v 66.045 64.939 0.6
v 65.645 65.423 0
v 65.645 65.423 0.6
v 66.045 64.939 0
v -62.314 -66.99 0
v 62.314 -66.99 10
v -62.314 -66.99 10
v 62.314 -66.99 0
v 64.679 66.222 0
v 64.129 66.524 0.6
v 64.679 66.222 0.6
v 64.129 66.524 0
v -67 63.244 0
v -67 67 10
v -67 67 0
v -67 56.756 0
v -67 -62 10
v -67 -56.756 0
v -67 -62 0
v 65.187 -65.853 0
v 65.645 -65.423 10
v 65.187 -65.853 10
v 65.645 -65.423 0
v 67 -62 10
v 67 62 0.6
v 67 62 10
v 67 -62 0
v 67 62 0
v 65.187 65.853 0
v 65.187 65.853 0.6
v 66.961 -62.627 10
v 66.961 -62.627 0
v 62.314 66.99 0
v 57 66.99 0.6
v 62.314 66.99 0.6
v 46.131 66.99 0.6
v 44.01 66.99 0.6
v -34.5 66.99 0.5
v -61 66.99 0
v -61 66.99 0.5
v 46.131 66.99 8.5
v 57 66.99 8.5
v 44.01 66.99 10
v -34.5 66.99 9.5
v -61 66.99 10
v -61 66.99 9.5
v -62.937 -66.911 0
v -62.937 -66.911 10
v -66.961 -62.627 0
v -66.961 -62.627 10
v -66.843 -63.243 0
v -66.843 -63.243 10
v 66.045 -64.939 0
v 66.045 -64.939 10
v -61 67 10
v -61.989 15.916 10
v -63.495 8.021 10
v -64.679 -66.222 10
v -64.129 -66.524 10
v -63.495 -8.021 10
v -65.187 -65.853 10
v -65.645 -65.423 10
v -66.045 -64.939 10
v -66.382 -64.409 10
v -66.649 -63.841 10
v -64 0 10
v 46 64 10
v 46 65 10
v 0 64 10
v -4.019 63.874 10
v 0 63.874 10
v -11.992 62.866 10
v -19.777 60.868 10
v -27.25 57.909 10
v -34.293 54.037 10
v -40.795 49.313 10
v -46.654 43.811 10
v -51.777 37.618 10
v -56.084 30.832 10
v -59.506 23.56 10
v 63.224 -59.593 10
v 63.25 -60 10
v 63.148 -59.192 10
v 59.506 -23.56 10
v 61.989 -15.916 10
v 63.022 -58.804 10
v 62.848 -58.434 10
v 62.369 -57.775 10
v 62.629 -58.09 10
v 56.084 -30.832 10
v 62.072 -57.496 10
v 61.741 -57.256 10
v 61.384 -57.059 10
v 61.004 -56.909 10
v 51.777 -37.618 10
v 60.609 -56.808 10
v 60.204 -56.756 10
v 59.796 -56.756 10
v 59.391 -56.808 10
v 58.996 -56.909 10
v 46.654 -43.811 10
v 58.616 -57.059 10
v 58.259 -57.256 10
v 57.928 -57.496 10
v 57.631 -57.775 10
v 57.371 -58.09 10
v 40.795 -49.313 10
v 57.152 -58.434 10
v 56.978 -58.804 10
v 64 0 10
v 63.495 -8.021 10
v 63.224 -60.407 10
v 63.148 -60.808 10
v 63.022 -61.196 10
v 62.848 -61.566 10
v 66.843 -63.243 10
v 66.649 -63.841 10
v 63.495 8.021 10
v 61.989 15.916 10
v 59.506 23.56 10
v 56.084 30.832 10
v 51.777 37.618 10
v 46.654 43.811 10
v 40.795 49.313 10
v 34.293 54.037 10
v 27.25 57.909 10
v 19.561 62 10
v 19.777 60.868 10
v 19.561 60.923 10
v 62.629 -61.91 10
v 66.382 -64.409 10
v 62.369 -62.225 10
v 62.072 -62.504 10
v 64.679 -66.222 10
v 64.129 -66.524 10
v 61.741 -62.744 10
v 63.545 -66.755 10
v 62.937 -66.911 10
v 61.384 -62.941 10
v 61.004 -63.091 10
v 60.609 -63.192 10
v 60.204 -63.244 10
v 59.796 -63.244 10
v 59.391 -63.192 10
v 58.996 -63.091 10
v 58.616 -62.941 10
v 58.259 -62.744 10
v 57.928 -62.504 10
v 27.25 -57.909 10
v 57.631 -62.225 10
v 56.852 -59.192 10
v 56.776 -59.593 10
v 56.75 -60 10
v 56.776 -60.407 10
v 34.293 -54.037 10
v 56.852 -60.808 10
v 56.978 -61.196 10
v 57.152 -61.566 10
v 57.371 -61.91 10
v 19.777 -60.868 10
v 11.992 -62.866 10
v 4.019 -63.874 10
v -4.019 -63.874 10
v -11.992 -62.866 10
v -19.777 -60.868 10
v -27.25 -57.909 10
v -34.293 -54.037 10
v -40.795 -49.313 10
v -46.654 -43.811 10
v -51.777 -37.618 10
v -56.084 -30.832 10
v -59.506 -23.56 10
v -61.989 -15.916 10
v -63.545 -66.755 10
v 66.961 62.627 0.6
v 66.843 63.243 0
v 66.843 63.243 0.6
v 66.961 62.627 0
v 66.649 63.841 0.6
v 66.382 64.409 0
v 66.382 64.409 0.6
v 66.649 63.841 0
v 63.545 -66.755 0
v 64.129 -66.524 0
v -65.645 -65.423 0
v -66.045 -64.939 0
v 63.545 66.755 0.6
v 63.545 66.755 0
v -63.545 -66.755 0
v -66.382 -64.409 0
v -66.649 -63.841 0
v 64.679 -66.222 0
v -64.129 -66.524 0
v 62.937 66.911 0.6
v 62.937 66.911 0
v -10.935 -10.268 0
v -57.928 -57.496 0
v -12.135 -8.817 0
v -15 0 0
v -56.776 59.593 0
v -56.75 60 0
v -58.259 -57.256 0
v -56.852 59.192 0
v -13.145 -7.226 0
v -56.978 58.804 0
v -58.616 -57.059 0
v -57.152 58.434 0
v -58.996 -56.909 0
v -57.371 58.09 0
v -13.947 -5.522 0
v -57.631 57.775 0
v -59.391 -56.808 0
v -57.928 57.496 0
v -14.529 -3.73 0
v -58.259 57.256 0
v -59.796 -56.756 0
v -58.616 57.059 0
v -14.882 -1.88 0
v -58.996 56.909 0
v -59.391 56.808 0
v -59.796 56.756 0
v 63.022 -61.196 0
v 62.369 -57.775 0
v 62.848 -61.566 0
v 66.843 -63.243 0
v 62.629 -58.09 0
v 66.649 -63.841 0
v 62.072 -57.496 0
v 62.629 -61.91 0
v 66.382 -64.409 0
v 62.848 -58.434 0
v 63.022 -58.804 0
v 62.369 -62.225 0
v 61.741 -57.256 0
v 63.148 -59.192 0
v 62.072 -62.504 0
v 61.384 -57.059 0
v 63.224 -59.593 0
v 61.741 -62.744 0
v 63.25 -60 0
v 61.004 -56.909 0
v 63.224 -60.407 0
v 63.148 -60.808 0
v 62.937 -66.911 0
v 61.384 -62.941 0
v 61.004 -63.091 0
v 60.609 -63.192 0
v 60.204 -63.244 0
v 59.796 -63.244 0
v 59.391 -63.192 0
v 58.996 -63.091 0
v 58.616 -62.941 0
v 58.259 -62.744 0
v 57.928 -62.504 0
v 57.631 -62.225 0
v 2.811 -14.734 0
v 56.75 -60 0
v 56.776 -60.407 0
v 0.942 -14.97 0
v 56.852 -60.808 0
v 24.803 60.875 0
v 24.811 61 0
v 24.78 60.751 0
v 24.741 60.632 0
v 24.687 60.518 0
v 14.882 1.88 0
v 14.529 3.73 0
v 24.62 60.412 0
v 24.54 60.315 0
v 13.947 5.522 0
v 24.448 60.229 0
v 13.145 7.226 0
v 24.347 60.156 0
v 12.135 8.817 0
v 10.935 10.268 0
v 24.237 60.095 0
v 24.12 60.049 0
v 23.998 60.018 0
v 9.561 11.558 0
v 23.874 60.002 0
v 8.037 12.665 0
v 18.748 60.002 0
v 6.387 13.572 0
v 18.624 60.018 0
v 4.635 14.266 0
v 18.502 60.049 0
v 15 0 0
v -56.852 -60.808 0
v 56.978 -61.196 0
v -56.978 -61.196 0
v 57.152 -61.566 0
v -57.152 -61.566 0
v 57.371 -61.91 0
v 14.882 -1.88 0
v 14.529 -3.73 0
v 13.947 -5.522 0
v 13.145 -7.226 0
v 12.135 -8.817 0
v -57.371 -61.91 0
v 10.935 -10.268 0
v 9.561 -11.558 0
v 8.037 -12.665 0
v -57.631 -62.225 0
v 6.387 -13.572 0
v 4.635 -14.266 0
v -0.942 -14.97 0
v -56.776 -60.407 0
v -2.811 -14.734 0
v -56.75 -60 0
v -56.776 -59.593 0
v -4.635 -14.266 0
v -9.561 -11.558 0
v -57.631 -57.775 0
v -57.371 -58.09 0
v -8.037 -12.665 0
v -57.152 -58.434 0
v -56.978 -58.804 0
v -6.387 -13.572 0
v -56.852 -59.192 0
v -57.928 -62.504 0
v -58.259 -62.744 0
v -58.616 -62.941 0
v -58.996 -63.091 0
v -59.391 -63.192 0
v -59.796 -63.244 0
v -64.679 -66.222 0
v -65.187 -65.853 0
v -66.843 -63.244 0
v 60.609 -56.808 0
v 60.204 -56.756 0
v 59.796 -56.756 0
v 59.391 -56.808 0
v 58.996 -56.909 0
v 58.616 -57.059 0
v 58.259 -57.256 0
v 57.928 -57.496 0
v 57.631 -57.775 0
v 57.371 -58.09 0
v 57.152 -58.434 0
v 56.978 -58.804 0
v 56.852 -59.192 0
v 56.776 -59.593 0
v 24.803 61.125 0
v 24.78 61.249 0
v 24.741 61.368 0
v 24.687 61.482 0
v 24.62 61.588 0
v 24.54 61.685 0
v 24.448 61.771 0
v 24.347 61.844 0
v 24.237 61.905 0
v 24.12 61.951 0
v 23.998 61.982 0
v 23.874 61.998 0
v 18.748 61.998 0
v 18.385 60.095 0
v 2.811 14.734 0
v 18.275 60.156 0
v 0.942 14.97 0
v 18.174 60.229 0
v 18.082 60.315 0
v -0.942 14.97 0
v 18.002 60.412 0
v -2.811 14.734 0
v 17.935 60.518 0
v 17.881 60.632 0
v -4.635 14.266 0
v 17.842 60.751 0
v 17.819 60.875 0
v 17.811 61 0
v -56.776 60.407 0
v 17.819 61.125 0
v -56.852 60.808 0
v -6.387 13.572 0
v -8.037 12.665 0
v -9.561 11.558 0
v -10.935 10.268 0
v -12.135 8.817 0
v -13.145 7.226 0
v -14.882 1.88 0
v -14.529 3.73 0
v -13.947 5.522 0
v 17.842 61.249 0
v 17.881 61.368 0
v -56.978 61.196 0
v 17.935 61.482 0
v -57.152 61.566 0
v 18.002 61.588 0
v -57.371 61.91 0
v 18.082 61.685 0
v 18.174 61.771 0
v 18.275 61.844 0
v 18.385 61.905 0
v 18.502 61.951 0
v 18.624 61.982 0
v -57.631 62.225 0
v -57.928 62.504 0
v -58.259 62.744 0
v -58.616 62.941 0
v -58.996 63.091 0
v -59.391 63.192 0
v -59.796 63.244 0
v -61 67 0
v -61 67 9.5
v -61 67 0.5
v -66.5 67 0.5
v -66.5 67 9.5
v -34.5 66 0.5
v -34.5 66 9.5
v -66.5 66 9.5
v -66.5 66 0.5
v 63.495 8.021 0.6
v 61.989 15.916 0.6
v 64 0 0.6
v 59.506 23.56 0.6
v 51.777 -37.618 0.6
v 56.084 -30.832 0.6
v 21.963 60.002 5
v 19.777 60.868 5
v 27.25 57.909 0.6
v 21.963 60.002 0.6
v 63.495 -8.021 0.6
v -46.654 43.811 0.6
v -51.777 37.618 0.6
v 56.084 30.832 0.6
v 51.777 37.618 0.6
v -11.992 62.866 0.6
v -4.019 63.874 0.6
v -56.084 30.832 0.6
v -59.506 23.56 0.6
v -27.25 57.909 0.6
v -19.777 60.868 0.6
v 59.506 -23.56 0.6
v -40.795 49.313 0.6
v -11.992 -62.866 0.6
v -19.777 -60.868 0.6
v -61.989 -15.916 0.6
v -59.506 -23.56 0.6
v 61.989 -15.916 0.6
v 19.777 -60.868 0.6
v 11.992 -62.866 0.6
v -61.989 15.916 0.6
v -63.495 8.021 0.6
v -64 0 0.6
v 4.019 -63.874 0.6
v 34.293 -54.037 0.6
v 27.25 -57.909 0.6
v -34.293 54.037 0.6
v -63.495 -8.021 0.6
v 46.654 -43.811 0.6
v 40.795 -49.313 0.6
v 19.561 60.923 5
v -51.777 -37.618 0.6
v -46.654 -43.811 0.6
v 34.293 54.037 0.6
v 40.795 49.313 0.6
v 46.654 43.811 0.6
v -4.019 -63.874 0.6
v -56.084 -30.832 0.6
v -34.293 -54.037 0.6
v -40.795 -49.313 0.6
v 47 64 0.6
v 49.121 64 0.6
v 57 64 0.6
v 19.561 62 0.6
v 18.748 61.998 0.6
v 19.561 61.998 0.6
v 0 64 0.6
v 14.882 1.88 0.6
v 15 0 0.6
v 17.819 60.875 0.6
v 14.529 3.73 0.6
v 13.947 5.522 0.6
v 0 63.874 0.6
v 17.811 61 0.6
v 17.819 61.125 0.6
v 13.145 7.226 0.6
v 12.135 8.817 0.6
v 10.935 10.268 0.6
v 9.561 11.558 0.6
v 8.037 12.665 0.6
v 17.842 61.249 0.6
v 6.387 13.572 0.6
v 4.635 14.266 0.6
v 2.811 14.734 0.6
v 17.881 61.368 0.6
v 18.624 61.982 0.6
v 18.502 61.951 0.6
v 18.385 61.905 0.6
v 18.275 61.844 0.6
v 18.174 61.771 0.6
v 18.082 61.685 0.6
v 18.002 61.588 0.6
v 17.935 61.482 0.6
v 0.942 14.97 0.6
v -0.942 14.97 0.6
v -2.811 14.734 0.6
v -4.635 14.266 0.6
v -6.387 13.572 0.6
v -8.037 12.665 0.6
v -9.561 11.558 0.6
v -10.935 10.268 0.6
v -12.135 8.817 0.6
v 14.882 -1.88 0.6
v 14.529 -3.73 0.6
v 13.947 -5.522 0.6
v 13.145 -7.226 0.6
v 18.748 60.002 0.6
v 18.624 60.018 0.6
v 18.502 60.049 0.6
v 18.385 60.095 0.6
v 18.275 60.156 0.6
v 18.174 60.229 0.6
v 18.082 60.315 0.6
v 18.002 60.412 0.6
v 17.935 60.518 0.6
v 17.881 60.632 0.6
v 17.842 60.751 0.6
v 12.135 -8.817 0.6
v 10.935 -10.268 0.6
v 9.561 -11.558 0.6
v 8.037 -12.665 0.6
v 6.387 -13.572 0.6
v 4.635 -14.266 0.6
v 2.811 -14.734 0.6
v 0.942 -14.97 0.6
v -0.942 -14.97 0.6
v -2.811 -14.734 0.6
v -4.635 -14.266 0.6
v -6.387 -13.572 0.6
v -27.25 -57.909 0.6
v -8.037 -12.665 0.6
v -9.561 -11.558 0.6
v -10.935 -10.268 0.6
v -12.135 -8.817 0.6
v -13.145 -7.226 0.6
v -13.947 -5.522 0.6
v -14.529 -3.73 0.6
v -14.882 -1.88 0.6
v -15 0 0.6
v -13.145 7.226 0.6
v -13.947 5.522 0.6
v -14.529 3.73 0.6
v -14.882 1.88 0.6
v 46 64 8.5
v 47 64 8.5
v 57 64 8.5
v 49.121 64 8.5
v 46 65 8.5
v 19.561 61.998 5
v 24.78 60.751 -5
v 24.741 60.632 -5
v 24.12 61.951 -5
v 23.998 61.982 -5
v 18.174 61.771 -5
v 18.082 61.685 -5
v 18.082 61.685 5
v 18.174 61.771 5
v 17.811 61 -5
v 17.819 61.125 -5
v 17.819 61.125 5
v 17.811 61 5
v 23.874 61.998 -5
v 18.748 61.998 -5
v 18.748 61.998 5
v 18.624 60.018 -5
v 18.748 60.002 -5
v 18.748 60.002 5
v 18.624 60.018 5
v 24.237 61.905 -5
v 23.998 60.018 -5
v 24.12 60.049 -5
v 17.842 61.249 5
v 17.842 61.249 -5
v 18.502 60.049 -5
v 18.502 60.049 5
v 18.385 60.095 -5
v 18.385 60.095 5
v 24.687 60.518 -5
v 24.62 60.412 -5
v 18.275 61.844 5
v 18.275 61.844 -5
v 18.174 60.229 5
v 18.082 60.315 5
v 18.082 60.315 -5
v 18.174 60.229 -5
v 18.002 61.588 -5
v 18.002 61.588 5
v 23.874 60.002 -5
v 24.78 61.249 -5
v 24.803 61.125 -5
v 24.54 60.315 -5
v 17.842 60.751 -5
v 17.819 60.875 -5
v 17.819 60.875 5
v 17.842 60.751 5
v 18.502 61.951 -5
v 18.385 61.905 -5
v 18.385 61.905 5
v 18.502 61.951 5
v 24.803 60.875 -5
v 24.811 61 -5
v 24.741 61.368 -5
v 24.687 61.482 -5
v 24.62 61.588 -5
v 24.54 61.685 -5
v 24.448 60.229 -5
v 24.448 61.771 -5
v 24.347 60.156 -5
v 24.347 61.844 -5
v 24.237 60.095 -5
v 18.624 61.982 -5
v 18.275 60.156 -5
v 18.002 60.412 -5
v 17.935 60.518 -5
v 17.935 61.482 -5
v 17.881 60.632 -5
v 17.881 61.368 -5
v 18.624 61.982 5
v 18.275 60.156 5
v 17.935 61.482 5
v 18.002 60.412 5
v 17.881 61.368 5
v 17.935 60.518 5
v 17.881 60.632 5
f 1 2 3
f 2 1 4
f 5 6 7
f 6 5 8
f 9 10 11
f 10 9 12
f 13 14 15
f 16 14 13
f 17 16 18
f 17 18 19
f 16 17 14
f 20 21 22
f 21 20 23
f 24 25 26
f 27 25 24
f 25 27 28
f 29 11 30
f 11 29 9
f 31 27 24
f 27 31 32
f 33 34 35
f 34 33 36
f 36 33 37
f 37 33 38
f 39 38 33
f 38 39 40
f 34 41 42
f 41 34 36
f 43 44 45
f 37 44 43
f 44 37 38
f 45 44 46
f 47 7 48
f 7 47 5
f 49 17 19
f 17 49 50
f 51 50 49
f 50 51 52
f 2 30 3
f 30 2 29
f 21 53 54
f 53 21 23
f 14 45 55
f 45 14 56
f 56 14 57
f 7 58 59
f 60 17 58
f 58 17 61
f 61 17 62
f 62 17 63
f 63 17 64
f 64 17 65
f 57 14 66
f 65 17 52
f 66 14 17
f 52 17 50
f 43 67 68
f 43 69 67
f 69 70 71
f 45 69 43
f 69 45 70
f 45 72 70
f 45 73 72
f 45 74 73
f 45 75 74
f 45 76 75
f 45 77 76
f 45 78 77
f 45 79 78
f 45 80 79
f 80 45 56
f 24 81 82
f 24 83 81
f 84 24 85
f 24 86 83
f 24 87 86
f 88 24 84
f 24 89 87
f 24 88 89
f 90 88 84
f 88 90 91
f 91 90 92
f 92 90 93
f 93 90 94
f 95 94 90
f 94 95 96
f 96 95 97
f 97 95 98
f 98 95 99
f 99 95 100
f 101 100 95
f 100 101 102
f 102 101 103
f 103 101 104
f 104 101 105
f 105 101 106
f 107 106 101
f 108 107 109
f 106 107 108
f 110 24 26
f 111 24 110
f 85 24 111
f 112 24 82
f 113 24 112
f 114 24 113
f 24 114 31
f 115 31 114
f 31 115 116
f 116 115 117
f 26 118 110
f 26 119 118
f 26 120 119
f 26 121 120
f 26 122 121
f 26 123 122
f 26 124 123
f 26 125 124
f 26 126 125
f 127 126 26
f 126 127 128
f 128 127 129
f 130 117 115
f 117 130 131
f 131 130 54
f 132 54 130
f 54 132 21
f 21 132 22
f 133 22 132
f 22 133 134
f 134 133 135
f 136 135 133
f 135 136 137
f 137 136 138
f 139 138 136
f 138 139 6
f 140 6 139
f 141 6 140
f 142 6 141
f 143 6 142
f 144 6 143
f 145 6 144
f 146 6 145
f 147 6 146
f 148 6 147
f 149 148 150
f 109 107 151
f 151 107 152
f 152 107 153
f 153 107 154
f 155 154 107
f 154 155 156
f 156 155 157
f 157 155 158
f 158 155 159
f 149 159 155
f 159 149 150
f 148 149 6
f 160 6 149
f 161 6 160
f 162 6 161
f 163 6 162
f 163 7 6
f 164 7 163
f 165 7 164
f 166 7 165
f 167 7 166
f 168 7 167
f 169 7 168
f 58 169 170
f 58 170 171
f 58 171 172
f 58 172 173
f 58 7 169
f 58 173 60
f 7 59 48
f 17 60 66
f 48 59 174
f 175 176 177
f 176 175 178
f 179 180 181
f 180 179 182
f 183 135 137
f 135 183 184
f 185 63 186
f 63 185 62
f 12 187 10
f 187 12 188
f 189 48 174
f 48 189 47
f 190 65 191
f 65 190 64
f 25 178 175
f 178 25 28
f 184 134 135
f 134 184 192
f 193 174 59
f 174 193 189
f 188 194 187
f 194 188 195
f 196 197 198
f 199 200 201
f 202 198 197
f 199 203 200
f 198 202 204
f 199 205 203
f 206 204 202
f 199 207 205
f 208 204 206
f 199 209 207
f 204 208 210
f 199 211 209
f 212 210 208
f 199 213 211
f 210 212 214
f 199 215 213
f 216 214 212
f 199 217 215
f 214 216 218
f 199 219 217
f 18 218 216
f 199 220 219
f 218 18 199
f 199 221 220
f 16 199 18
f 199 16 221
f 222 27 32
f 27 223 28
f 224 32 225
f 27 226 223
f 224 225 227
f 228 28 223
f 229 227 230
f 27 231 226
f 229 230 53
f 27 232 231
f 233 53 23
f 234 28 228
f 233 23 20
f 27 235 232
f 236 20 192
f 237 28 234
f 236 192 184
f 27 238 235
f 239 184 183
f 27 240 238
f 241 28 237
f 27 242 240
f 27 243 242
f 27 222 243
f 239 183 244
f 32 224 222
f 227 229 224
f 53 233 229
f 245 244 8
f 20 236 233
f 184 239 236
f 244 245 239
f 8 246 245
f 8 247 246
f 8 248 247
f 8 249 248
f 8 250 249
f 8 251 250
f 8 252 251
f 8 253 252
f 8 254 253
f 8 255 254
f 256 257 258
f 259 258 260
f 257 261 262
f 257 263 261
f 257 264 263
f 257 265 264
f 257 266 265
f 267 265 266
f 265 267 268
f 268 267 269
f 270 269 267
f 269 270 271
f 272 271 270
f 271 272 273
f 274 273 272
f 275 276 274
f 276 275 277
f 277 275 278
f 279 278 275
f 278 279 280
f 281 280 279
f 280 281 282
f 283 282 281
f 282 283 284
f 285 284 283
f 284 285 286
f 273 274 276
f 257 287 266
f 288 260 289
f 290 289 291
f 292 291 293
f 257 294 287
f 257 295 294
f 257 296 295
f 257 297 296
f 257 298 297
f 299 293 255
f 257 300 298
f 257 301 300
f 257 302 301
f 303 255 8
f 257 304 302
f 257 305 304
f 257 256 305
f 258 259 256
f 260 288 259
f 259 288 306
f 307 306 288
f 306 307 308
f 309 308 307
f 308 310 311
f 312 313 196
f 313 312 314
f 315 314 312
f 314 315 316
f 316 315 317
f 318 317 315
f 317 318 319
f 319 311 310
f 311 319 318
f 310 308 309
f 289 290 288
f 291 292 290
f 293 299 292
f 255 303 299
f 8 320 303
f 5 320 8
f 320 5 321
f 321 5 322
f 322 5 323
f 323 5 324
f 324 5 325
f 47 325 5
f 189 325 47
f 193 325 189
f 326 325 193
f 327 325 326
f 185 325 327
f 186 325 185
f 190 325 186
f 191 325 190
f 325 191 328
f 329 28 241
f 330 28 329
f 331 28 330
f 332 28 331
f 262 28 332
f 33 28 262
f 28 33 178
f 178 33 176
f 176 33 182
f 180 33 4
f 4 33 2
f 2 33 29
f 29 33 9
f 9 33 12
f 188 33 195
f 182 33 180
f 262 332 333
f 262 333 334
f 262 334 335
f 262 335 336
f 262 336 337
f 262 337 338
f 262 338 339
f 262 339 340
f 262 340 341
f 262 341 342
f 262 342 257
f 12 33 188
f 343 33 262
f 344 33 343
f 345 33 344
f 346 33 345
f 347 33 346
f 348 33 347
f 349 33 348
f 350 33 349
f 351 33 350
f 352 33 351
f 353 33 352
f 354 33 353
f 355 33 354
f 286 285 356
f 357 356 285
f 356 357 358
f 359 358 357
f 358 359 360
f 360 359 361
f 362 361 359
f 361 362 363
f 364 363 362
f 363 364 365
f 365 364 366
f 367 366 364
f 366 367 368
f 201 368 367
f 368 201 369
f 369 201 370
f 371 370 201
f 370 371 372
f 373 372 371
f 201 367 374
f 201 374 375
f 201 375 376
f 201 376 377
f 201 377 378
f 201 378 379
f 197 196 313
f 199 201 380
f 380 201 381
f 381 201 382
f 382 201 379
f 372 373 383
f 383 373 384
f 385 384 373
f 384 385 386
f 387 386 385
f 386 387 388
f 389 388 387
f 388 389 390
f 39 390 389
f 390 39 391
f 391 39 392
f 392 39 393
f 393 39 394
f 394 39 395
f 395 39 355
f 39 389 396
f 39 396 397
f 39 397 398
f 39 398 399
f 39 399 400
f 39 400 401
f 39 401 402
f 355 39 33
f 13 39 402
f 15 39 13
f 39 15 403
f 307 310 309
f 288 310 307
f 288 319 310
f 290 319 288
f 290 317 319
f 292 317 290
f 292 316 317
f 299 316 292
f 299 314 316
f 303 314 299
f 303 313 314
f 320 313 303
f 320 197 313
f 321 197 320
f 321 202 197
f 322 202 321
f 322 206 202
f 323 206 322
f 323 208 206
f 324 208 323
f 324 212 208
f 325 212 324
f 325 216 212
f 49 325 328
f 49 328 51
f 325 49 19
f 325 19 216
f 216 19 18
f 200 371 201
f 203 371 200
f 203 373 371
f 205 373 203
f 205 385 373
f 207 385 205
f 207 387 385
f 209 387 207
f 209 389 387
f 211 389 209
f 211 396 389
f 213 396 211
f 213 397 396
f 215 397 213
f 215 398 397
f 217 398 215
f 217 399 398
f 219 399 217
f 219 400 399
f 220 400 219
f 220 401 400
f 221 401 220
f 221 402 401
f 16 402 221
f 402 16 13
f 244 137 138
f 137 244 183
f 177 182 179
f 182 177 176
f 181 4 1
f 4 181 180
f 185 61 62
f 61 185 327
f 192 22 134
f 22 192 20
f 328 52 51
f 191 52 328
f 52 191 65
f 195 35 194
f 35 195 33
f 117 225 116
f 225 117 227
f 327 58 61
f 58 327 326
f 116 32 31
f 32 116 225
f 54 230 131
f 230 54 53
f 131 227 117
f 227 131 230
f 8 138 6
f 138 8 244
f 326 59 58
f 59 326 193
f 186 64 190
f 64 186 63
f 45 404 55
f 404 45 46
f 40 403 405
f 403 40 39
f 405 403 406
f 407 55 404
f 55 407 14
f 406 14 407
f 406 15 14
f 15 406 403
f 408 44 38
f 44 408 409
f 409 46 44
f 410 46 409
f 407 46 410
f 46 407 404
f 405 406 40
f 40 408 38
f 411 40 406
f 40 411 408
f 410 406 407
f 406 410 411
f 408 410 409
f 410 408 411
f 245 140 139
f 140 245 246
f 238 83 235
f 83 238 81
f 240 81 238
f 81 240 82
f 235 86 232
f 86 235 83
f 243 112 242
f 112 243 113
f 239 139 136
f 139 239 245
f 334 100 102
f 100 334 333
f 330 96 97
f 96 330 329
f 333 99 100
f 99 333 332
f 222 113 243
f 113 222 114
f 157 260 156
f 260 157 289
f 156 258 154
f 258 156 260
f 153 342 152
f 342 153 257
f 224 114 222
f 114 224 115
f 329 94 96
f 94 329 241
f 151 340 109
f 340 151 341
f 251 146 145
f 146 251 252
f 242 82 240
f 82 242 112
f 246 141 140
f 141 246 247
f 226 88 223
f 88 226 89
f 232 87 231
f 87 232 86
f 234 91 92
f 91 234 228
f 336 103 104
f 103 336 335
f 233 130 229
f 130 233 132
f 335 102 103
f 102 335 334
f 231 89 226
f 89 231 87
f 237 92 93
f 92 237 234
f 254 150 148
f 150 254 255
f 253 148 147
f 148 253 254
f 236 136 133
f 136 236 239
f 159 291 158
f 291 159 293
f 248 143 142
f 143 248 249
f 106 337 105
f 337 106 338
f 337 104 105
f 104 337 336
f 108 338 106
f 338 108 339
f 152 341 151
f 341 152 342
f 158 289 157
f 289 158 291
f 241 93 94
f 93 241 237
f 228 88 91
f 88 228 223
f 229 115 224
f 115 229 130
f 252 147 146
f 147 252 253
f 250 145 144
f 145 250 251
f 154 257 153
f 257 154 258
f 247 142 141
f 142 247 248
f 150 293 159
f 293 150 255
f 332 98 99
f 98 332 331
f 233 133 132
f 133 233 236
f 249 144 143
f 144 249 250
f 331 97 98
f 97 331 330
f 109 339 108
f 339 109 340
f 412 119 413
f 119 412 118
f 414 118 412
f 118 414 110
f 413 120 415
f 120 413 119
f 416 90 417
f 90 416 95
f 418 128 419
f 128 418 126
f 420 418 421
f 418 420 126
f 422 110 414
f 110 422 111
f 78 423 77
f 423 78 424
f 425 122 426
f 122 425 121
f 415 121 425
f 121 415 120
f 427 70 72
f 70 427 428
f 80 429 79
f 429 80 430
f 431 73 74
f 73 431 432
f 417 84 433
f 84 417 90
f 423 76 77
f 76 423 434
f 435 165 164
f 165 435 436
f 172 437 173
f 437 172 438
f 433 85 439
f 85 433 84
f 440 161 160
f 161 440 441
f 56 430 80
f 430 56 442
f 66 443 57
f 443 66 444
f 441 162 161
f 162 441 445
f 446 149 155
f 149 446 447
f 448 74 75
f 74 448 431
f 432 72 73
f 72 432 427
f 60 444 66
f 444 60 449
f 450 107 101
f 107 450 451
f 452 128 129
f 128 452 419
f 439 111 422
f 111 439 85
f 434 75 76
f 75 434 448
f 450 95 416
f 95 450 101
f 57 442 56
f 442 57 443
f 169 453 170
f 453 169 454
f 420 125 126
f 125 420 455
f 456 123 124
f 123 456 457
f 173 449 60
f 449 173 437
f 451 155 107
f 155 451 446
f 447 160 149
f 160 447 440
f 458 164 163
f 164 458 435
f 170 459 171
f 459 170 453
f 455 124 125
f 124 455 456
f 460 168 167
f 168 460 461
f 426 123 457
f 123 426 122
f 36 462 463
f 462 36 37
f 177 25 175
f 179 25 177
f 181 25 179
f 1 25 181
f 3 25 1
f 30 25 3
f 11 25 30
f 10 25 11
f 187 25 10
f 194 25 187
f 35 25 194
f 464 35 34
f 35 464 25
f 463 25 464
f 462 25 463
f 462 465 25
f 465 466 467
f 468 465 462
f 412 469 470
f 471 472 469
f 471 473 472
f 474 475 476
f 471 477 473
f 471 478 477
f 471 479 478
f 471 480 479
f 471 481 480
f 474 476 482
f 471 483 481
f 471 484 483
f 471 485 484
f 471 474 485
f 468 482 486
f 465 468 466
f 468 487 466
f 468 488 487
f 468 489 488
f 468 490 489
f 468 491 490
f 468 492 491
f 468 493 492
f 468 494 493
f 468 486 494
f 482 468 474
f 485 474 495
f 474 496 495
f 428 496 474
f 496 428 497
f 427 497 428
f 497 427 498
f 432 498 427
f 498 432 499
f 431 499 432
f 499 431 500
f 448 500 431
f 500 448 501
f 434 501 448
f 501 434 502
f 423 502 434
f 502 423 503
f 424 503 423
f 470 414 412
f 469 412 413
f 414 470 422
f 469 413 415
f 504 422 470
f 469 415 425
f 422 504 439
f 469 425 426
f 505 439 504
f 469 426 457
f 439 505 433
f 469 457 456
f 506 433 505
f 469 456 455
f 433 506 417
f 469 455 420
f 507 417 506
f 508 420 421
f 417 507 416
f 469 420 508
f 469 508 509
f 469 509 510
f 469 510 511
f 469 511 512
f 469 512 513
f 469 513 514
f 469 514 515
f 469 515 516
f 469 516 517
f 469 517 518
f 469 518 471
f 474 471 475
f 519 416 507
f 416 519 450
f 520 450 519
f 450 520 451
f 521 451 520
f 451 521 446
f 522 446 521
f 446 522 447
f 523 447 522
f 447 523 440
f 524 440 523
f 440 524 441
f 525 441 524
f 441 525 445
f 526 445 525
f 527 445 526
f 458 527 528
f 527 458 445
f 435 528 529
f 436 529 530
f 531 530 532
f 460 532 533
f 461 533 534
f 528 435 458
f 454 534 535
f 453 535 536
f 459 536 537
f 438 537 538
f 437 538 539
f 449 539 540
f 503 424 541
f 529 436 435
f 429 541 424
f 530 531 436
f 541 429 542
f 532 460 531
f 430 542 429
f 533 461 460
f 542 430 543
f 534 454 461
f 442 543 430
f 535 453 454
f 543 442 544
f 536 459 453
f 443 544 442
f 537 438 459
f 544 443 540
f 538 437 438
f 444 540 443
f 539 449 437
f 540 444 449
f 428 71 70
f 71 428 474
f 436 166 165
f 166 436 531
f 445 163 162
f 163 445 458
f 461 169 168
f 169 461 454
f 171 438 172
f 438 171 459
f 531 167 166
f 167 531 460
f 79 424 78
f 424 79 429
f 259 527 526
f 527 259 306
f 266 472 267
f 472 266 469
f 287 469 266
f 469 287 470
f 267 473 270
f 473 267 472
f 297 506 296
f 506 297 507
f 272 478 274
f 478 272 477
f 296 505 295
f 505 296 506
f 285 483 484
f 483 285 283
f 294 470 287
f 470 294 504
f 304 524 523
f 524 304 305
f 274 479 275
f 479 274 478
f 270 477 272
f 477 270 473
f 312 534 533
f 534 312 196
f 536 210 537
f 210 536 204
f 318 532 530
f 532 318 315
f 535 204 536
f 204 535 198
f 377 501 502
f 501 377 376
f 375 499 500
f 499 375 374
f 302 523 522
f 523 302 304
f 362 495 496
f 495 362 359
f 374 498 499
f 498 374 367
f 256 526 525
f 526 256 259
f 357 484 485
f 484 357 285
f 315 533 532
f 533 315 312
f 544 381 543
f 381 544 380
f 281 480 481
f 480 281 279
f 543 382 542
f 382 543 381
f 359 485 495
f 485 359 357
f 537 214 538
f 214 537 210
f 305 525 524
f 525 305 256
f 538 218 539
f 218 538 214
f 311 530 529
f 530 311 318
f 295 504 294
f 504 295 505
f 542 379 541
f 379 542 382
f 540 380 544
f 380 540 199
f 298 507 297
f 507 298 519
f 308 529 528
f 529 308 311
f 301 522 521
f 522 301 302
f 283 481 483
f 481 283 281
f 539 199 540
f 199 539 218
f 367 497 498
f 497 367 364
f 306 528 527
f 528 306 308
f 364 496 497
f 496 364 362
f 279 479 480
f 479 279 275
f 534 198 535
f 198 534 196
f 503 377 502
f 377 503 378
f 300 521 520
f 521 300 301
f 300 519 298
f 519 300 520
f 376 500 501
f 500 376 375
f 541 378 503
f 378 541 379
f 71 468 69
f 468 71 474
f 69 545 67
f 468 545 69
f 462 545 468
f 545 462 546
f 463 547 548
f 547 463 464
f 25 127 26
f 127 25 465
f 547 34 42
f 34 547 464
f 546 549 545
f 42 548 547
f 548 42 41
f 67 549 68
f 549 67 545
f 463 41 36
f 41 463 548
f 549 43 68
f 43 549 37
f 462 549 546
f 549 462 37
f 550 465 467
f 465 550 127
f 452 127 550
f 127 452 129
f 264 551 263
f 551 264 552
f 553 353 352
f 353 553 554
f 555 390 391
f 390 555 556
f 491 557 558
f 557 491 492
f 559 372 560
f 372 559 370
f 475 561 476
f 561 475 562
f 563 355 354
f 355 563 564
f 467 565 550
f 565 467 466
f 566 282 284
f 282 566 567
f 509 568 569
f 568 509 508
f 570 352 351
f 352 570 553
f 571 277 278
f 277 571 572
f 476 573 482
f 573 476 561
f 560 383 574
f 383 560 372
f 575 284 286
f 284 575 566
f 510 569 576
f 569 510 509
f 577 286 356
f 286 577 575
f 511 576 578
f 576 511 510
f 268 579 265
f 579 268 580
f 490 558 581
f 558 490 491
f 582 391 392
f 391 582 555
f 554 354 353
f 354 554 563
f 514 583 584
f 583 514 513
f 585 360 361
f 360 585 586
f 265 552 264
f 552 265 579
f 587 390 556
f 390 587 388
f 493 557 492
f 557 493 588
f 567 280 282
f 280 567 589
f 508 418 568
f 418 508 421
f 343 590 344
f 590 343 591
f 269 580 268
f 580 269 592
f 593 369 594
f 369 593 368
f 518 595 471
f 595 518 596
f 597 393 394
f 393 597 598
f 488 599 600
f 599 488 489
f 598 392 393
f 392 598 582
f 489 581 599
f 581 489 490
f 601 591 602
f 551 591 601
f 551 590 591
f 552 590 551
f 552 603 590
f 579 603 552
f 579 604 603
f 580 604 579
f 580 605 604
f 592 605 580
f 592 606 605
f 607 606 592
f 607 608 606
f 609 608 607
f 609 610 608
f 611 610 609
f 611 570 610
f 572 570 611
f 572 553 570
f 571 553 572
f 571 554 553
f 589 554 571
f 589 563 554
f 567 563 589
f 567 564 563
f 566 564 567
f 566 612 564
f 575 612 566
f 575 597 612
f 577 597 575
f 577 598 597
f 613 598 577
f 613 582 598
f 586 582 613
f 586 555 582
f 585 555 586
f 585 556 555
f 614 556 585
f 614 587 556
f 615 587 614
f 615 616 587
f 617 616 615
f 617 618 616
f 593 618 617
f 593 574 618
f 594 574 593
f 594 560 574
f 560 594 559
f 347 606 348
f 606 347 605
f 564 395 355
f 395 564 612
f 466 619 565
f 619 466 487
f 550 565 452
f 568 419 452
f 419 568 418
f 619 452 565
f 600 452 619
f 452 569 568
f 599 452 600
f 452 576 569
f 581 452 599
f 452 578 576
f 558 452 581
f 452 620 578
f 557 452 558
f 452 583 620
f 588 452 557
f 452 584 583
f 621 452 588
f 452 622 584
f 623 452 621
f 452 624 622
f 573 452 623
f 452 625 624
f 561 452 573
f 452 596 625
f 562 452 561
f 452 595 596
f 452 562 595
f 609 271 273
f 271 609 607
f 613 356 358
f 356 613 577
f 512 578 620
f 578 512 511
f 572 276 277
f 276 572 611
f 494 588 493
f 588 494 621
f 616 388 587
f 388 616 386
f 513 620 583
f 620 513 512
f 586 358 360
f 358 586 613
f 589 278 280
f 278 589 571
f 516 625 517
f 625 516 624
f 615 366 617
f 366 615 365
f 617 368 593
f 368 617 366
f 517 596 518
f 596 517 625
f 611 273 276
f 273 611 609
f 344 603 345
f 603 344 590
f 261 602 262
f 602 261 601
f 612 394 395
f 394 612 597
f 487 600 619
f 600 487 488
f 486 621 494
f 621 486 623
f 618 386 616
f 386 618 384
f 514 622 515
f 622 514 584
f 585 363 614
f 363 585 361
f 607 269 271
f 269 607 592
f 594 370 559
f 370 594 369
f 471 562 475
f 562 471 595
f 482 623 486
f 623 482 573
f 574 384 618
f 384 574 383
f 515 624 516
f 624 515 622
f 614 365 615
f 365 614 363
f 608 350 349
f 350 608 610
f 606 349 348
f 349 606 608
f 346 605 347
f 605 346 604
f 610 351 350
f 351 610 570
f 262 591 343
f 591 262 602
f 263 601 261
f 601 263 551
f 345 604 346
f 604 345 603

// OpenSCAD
$fn = 50;


union() {
	difference() {
		union() {
			hull() {
				translate(v = [-62.0000000000, 62.0000000000, 0]) {
					cylinder(h = 10, r = 5);
				}
				translate(v = [62.0000000000, 62.0000000000, 0]) {
					cylinder(h = 10, r = 5);
				}
				translate(v = [-62.0000000000, -62.0000000000, 0]) {
					cylinder(h = 10, r = 5);
				}
				translate(v = [62.0000000000, -62.0000000000, 0]) {
					cylinder(h = 10, r = 5);
				}
			}
			translate(v = [-67.0000000000, 61.0000000000, 0]) {
				cube(size = [6, 6, 10]);
			}
		}
		union() {
			translate(v = [-67.5000000000, -60.0000000000, -250.0000000000]) {
				rotate(a = [0, 0, 0]) {
					difference() {
						union() {
							hull() {
								translate(v = [7.5000000000, 0, 0]) {
									cylinder(h = 250, r = 3.2500000000, r1 = 3.2500000000, r2 = 3.2500000000);
								}
								translate(v = [-7.5000000000, 0, 0]) {
									cylinder(h = 250, r = 3.2500000000, r1 = 3.2500000000, r2 = 3.2500000000);
								}
							}
						}
						union();
					}
				}
			}
			translate(v = [-67.5000000000, 60.0000000000, -250.0000000000]) {
				rotate(a = [0, 0, 0]) {
					difference() {
						union() {
							hull() {
								translate(v = [7.5000000000, 0, 0]) {
									cylinder(h = 250, r = 3.2500000000, r1 = 3.2500000000, r2 = 3.2500000000);
								}
								translate(v = [-7.5000000000, 0, 0]) {
									cylinder(h = 250, r = 3.2500000000, r1 = 3.2500000000, r2 = 3.2500000000);
								}
							}
						}
						union();
					}
				}
			}
			translate(v = [-66.5000000000, 66.0000000000, 0.5000000000]) {
				cube(size = [32, 1, 9.0000000000]);
			}
			translate(v = [60.0000000000, -60.0000000000, 0]) {
				cylinder(h = 100, r = 3.2500000000);
			}
			translate(v = [0, 0, 0.6000000000]) {
				cylinder(h = 12.4000000000, r = 64.0000000000);
			}
			translate(v = [0, 0, -5.0000000000]) {
				cylinder(h = 10, r = 15.0000000000);
			}
			translate(v = [0.0000000000, 62.0000000000, 0.6000000000]) {
				cube(size = [67.0000000000, 2, 12.4000000000]);
			}
			translate(v = [57.0000000000, 62.0000000000, 0.6000000000]) {
				cube(size = [10, 5, 12.4000000000]);
			}
			translate(v = [46.0000000000, 62.0000000000, 8.5000000000]) {
				cube(size = [21, 5, 1.5000000000]);
			}
			translate(v = [43.2500000000, 67.7500000000, 0.6000000000]) {
				rotate(a = [0, 0, -45]) {
					cube(size = [7.5000000000, 1.5000000000, 12.4000000000]);
				}
			}
			translate(v = [12.0610000000, 60.0000000000, 0.6000000000]) {
				cube(size = [7.5000000000, 2, 9.4000000000]);
			}
		}
	}
	union() {
		translate(v = [21.3110000000, 61.0000000000, -5.0000000000]) {
			rotate(a = [0, 0, 0]) {
				difference() {
					union() {
						#hull() {
							#translate(v = [2.5000000000, 0, 0]) {
								cylinder(h = 10, r = 1.0000000000, r1 = 1.0000000000, r2 = 1.0000000000);
							}
							#translate(v = [-2.5000000000, 0, 0]) {
								cylinder(h = 10, r = 1.0000000000, r1 = 1.0000000000, r2 = 1.0000000000);
							}
						}
					}
					union();
				}
			}
		}
	}
}
